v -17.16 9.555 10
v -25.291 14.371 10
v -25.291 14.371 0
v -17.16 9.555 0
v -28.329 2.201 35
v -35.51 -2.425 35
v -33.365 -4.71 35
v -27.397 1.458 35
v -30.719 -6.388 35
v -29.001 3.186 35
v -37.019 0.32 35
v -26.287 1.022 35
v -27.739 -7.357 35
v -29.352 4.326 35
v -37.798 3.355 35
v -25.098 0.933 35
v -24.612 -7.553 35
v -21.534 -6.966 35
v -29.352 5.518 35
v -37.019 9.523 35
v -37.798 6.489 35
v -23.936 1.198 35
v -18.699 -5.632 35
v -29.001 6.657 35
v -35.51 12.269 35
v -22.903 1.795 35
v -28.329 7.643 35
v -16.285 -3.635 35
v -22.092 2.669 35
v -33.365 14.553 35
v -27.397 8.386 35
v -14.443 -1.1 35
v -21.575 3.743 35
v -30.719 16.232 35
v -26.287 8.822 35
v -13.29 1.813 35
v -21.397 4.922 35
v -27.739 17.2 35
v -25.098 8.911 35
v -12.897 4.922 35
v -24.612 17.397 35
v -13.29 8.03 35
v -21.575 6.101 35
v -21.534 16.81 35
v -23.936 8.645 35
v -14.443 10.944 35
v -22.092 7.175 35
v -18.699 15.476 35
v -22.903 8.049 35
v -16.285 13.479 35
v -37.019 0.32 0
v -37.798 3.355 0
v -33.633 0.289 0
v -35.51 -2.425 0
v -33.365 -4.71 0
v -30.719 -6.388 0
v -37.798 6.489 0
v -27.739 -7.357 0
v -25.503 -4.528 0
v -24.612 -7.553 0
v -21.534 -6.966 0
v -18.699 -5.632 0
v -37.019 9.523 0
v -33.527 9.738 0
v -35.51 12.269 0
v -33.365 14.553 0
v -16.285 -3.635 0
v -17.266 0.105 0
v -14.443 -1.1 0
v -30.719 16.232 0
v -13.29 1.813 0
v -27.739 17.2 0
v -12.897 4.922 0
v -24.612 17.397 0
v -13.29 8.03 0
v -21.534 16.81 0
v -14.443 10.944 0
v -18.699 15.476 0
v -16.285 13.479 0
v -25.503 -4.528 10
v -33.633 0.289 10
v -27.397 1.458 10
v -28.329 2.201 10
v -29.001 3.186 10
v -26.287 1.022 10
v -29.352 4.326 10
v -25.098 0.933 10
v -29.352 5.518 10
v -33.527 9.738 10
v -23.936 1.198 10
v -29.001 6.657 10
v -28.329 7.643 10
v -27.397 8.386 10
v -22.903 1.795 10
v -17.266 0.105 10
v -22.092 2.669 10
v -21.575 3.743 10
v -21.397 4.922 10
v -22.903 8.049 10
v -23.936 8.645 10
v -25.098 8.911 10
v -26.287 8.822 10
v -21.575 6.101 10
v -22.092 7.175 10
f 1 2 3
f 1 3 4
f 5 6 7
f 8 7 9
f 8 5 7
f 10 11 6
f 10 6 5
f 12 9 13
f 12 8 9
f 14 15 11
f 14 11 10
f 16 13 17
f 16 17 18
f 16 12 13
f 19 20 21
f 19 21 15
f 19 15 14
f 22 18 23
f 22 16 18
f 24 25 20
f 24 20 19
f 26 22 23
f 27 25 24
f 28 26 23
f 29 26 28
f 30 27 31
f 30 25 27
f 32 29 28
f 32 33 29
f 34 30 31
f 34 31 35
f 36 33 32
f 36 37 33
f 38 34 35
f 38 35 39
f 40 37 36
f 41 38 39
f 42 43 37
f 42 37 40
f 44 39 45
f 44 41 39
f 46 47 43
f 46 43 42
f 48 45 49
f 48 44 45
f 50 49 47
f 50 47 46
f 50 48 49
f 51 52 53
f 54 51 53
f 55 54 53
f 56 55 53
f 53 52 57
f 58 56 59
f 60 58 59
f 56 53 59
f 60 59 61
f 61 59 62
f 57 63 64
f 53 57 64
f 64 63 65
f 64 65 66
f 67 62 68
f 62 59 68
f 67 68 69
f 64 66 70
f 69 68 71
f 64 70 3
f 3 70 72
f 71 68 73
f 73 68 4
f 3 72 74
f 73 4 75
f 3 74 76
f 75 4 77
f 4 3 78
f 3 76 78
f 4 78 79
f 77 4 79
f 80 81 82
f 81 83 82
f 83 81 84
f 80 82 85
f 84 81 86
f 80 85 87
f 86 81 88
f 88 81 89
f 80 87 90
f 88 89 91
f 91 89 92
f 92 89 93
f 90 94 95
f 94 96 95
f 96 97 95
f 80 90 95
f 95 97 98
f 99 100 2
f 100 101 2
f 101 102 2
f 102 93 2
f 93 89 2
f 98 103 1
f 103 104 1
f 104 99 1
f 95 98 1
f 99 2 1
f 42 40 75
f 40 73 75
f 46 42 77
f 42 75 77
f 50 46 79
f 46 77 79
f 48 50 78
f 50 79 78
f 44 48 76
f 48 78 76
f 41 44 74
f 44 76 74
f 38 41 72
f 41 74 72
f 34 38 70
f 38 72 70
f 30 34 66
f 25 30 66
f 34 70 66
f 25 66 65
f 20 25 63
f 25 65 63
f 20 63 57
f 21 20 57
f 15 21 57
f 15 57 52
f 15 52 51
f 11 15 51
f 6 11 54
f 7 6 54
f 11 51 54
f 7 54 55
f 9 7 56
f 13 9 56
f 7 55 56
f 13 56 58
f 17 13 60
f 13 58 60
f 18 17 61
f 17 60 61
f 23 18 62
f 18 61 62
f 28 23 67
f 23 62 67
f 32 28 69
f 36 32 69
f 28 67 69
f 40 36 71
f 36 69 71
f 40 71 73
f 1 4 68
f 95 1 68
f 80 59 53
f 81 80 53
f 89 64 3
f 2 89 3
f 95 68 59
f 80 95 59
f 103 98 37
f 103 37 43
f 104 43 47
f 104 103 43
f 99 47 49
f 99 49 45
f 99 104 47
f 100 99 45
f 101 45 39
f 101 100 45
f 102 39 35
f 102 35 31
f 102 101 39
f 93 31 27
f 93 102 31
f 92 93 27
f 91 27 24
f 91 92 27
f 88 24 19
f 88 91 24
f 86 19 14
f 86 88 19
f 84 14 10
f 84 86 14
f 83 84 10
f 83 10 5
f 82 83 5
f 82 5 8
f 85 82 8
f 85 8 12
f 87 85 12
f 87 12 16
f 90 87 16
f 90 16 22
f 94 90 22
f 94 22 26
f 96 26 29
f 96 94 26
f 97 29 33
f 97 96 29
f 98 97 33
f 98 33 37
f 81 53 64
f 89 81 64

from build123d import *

# Parameters (mm, degrees)
F0_R     = 12.5
F1_DEPTH = 10
F2_R     = 12.5
F2_R_2   = 4
F3_DEPTH = 25


with BuildPart() as f1:
    # F0 (on Top) → F1 (new body)
    with BuildSketch(Plane.XY):
        with Locations((-25.3968760371, 4.9218749627)):
            Circle(F0_R)
        Polygon((-17.1604870534, 9.5548433965), (-17.2664131867, 0.1054370842), (-25.5028021704, -4.5275313495), (-33.6332650209, 0.288906529), (-33.5273388876, 9.7383128413), (-25.2909499038, 14.371281275), align=None, mode=Mode.SUBTRACT)
    extrude(amount=F1_DEPTH)

    # F2 (on face) → F3 (join)
    with BuildSketch(Plane.XY.offset(10)):
        with Locations((-25.3968760371, 4.9218749627)):
            Circle(F2_R)
        Polygon((-25.2909499038, 14.371281275), (-17.1604870534, 9.5548433965), (-17.2664131867, 0.1054370842), (-25.5028021704, -4.5275313495), (-33.6332650209, 0.288906529), (-33.5273388876, 9.7383128413), align=None, mode=Mode.SUBTRACT)
        Polygon((-17.2664131867, 0.1054370842), (-17.1604870534, 9.5548433965), (-25.2909499038, 14.371281275), (-33.5273388876, 9.7383128413), (-33.6332650209, 0.288906529), (-25.5028021704, -4.5275313495), align=None)
        with Locations((-25.3968760371, 4.9218749627)):
            Circle(F2_R_2, mode=Mode.SUBTRACT)
    extrude(amount=F3_DEPTH)


solid = f1.part
